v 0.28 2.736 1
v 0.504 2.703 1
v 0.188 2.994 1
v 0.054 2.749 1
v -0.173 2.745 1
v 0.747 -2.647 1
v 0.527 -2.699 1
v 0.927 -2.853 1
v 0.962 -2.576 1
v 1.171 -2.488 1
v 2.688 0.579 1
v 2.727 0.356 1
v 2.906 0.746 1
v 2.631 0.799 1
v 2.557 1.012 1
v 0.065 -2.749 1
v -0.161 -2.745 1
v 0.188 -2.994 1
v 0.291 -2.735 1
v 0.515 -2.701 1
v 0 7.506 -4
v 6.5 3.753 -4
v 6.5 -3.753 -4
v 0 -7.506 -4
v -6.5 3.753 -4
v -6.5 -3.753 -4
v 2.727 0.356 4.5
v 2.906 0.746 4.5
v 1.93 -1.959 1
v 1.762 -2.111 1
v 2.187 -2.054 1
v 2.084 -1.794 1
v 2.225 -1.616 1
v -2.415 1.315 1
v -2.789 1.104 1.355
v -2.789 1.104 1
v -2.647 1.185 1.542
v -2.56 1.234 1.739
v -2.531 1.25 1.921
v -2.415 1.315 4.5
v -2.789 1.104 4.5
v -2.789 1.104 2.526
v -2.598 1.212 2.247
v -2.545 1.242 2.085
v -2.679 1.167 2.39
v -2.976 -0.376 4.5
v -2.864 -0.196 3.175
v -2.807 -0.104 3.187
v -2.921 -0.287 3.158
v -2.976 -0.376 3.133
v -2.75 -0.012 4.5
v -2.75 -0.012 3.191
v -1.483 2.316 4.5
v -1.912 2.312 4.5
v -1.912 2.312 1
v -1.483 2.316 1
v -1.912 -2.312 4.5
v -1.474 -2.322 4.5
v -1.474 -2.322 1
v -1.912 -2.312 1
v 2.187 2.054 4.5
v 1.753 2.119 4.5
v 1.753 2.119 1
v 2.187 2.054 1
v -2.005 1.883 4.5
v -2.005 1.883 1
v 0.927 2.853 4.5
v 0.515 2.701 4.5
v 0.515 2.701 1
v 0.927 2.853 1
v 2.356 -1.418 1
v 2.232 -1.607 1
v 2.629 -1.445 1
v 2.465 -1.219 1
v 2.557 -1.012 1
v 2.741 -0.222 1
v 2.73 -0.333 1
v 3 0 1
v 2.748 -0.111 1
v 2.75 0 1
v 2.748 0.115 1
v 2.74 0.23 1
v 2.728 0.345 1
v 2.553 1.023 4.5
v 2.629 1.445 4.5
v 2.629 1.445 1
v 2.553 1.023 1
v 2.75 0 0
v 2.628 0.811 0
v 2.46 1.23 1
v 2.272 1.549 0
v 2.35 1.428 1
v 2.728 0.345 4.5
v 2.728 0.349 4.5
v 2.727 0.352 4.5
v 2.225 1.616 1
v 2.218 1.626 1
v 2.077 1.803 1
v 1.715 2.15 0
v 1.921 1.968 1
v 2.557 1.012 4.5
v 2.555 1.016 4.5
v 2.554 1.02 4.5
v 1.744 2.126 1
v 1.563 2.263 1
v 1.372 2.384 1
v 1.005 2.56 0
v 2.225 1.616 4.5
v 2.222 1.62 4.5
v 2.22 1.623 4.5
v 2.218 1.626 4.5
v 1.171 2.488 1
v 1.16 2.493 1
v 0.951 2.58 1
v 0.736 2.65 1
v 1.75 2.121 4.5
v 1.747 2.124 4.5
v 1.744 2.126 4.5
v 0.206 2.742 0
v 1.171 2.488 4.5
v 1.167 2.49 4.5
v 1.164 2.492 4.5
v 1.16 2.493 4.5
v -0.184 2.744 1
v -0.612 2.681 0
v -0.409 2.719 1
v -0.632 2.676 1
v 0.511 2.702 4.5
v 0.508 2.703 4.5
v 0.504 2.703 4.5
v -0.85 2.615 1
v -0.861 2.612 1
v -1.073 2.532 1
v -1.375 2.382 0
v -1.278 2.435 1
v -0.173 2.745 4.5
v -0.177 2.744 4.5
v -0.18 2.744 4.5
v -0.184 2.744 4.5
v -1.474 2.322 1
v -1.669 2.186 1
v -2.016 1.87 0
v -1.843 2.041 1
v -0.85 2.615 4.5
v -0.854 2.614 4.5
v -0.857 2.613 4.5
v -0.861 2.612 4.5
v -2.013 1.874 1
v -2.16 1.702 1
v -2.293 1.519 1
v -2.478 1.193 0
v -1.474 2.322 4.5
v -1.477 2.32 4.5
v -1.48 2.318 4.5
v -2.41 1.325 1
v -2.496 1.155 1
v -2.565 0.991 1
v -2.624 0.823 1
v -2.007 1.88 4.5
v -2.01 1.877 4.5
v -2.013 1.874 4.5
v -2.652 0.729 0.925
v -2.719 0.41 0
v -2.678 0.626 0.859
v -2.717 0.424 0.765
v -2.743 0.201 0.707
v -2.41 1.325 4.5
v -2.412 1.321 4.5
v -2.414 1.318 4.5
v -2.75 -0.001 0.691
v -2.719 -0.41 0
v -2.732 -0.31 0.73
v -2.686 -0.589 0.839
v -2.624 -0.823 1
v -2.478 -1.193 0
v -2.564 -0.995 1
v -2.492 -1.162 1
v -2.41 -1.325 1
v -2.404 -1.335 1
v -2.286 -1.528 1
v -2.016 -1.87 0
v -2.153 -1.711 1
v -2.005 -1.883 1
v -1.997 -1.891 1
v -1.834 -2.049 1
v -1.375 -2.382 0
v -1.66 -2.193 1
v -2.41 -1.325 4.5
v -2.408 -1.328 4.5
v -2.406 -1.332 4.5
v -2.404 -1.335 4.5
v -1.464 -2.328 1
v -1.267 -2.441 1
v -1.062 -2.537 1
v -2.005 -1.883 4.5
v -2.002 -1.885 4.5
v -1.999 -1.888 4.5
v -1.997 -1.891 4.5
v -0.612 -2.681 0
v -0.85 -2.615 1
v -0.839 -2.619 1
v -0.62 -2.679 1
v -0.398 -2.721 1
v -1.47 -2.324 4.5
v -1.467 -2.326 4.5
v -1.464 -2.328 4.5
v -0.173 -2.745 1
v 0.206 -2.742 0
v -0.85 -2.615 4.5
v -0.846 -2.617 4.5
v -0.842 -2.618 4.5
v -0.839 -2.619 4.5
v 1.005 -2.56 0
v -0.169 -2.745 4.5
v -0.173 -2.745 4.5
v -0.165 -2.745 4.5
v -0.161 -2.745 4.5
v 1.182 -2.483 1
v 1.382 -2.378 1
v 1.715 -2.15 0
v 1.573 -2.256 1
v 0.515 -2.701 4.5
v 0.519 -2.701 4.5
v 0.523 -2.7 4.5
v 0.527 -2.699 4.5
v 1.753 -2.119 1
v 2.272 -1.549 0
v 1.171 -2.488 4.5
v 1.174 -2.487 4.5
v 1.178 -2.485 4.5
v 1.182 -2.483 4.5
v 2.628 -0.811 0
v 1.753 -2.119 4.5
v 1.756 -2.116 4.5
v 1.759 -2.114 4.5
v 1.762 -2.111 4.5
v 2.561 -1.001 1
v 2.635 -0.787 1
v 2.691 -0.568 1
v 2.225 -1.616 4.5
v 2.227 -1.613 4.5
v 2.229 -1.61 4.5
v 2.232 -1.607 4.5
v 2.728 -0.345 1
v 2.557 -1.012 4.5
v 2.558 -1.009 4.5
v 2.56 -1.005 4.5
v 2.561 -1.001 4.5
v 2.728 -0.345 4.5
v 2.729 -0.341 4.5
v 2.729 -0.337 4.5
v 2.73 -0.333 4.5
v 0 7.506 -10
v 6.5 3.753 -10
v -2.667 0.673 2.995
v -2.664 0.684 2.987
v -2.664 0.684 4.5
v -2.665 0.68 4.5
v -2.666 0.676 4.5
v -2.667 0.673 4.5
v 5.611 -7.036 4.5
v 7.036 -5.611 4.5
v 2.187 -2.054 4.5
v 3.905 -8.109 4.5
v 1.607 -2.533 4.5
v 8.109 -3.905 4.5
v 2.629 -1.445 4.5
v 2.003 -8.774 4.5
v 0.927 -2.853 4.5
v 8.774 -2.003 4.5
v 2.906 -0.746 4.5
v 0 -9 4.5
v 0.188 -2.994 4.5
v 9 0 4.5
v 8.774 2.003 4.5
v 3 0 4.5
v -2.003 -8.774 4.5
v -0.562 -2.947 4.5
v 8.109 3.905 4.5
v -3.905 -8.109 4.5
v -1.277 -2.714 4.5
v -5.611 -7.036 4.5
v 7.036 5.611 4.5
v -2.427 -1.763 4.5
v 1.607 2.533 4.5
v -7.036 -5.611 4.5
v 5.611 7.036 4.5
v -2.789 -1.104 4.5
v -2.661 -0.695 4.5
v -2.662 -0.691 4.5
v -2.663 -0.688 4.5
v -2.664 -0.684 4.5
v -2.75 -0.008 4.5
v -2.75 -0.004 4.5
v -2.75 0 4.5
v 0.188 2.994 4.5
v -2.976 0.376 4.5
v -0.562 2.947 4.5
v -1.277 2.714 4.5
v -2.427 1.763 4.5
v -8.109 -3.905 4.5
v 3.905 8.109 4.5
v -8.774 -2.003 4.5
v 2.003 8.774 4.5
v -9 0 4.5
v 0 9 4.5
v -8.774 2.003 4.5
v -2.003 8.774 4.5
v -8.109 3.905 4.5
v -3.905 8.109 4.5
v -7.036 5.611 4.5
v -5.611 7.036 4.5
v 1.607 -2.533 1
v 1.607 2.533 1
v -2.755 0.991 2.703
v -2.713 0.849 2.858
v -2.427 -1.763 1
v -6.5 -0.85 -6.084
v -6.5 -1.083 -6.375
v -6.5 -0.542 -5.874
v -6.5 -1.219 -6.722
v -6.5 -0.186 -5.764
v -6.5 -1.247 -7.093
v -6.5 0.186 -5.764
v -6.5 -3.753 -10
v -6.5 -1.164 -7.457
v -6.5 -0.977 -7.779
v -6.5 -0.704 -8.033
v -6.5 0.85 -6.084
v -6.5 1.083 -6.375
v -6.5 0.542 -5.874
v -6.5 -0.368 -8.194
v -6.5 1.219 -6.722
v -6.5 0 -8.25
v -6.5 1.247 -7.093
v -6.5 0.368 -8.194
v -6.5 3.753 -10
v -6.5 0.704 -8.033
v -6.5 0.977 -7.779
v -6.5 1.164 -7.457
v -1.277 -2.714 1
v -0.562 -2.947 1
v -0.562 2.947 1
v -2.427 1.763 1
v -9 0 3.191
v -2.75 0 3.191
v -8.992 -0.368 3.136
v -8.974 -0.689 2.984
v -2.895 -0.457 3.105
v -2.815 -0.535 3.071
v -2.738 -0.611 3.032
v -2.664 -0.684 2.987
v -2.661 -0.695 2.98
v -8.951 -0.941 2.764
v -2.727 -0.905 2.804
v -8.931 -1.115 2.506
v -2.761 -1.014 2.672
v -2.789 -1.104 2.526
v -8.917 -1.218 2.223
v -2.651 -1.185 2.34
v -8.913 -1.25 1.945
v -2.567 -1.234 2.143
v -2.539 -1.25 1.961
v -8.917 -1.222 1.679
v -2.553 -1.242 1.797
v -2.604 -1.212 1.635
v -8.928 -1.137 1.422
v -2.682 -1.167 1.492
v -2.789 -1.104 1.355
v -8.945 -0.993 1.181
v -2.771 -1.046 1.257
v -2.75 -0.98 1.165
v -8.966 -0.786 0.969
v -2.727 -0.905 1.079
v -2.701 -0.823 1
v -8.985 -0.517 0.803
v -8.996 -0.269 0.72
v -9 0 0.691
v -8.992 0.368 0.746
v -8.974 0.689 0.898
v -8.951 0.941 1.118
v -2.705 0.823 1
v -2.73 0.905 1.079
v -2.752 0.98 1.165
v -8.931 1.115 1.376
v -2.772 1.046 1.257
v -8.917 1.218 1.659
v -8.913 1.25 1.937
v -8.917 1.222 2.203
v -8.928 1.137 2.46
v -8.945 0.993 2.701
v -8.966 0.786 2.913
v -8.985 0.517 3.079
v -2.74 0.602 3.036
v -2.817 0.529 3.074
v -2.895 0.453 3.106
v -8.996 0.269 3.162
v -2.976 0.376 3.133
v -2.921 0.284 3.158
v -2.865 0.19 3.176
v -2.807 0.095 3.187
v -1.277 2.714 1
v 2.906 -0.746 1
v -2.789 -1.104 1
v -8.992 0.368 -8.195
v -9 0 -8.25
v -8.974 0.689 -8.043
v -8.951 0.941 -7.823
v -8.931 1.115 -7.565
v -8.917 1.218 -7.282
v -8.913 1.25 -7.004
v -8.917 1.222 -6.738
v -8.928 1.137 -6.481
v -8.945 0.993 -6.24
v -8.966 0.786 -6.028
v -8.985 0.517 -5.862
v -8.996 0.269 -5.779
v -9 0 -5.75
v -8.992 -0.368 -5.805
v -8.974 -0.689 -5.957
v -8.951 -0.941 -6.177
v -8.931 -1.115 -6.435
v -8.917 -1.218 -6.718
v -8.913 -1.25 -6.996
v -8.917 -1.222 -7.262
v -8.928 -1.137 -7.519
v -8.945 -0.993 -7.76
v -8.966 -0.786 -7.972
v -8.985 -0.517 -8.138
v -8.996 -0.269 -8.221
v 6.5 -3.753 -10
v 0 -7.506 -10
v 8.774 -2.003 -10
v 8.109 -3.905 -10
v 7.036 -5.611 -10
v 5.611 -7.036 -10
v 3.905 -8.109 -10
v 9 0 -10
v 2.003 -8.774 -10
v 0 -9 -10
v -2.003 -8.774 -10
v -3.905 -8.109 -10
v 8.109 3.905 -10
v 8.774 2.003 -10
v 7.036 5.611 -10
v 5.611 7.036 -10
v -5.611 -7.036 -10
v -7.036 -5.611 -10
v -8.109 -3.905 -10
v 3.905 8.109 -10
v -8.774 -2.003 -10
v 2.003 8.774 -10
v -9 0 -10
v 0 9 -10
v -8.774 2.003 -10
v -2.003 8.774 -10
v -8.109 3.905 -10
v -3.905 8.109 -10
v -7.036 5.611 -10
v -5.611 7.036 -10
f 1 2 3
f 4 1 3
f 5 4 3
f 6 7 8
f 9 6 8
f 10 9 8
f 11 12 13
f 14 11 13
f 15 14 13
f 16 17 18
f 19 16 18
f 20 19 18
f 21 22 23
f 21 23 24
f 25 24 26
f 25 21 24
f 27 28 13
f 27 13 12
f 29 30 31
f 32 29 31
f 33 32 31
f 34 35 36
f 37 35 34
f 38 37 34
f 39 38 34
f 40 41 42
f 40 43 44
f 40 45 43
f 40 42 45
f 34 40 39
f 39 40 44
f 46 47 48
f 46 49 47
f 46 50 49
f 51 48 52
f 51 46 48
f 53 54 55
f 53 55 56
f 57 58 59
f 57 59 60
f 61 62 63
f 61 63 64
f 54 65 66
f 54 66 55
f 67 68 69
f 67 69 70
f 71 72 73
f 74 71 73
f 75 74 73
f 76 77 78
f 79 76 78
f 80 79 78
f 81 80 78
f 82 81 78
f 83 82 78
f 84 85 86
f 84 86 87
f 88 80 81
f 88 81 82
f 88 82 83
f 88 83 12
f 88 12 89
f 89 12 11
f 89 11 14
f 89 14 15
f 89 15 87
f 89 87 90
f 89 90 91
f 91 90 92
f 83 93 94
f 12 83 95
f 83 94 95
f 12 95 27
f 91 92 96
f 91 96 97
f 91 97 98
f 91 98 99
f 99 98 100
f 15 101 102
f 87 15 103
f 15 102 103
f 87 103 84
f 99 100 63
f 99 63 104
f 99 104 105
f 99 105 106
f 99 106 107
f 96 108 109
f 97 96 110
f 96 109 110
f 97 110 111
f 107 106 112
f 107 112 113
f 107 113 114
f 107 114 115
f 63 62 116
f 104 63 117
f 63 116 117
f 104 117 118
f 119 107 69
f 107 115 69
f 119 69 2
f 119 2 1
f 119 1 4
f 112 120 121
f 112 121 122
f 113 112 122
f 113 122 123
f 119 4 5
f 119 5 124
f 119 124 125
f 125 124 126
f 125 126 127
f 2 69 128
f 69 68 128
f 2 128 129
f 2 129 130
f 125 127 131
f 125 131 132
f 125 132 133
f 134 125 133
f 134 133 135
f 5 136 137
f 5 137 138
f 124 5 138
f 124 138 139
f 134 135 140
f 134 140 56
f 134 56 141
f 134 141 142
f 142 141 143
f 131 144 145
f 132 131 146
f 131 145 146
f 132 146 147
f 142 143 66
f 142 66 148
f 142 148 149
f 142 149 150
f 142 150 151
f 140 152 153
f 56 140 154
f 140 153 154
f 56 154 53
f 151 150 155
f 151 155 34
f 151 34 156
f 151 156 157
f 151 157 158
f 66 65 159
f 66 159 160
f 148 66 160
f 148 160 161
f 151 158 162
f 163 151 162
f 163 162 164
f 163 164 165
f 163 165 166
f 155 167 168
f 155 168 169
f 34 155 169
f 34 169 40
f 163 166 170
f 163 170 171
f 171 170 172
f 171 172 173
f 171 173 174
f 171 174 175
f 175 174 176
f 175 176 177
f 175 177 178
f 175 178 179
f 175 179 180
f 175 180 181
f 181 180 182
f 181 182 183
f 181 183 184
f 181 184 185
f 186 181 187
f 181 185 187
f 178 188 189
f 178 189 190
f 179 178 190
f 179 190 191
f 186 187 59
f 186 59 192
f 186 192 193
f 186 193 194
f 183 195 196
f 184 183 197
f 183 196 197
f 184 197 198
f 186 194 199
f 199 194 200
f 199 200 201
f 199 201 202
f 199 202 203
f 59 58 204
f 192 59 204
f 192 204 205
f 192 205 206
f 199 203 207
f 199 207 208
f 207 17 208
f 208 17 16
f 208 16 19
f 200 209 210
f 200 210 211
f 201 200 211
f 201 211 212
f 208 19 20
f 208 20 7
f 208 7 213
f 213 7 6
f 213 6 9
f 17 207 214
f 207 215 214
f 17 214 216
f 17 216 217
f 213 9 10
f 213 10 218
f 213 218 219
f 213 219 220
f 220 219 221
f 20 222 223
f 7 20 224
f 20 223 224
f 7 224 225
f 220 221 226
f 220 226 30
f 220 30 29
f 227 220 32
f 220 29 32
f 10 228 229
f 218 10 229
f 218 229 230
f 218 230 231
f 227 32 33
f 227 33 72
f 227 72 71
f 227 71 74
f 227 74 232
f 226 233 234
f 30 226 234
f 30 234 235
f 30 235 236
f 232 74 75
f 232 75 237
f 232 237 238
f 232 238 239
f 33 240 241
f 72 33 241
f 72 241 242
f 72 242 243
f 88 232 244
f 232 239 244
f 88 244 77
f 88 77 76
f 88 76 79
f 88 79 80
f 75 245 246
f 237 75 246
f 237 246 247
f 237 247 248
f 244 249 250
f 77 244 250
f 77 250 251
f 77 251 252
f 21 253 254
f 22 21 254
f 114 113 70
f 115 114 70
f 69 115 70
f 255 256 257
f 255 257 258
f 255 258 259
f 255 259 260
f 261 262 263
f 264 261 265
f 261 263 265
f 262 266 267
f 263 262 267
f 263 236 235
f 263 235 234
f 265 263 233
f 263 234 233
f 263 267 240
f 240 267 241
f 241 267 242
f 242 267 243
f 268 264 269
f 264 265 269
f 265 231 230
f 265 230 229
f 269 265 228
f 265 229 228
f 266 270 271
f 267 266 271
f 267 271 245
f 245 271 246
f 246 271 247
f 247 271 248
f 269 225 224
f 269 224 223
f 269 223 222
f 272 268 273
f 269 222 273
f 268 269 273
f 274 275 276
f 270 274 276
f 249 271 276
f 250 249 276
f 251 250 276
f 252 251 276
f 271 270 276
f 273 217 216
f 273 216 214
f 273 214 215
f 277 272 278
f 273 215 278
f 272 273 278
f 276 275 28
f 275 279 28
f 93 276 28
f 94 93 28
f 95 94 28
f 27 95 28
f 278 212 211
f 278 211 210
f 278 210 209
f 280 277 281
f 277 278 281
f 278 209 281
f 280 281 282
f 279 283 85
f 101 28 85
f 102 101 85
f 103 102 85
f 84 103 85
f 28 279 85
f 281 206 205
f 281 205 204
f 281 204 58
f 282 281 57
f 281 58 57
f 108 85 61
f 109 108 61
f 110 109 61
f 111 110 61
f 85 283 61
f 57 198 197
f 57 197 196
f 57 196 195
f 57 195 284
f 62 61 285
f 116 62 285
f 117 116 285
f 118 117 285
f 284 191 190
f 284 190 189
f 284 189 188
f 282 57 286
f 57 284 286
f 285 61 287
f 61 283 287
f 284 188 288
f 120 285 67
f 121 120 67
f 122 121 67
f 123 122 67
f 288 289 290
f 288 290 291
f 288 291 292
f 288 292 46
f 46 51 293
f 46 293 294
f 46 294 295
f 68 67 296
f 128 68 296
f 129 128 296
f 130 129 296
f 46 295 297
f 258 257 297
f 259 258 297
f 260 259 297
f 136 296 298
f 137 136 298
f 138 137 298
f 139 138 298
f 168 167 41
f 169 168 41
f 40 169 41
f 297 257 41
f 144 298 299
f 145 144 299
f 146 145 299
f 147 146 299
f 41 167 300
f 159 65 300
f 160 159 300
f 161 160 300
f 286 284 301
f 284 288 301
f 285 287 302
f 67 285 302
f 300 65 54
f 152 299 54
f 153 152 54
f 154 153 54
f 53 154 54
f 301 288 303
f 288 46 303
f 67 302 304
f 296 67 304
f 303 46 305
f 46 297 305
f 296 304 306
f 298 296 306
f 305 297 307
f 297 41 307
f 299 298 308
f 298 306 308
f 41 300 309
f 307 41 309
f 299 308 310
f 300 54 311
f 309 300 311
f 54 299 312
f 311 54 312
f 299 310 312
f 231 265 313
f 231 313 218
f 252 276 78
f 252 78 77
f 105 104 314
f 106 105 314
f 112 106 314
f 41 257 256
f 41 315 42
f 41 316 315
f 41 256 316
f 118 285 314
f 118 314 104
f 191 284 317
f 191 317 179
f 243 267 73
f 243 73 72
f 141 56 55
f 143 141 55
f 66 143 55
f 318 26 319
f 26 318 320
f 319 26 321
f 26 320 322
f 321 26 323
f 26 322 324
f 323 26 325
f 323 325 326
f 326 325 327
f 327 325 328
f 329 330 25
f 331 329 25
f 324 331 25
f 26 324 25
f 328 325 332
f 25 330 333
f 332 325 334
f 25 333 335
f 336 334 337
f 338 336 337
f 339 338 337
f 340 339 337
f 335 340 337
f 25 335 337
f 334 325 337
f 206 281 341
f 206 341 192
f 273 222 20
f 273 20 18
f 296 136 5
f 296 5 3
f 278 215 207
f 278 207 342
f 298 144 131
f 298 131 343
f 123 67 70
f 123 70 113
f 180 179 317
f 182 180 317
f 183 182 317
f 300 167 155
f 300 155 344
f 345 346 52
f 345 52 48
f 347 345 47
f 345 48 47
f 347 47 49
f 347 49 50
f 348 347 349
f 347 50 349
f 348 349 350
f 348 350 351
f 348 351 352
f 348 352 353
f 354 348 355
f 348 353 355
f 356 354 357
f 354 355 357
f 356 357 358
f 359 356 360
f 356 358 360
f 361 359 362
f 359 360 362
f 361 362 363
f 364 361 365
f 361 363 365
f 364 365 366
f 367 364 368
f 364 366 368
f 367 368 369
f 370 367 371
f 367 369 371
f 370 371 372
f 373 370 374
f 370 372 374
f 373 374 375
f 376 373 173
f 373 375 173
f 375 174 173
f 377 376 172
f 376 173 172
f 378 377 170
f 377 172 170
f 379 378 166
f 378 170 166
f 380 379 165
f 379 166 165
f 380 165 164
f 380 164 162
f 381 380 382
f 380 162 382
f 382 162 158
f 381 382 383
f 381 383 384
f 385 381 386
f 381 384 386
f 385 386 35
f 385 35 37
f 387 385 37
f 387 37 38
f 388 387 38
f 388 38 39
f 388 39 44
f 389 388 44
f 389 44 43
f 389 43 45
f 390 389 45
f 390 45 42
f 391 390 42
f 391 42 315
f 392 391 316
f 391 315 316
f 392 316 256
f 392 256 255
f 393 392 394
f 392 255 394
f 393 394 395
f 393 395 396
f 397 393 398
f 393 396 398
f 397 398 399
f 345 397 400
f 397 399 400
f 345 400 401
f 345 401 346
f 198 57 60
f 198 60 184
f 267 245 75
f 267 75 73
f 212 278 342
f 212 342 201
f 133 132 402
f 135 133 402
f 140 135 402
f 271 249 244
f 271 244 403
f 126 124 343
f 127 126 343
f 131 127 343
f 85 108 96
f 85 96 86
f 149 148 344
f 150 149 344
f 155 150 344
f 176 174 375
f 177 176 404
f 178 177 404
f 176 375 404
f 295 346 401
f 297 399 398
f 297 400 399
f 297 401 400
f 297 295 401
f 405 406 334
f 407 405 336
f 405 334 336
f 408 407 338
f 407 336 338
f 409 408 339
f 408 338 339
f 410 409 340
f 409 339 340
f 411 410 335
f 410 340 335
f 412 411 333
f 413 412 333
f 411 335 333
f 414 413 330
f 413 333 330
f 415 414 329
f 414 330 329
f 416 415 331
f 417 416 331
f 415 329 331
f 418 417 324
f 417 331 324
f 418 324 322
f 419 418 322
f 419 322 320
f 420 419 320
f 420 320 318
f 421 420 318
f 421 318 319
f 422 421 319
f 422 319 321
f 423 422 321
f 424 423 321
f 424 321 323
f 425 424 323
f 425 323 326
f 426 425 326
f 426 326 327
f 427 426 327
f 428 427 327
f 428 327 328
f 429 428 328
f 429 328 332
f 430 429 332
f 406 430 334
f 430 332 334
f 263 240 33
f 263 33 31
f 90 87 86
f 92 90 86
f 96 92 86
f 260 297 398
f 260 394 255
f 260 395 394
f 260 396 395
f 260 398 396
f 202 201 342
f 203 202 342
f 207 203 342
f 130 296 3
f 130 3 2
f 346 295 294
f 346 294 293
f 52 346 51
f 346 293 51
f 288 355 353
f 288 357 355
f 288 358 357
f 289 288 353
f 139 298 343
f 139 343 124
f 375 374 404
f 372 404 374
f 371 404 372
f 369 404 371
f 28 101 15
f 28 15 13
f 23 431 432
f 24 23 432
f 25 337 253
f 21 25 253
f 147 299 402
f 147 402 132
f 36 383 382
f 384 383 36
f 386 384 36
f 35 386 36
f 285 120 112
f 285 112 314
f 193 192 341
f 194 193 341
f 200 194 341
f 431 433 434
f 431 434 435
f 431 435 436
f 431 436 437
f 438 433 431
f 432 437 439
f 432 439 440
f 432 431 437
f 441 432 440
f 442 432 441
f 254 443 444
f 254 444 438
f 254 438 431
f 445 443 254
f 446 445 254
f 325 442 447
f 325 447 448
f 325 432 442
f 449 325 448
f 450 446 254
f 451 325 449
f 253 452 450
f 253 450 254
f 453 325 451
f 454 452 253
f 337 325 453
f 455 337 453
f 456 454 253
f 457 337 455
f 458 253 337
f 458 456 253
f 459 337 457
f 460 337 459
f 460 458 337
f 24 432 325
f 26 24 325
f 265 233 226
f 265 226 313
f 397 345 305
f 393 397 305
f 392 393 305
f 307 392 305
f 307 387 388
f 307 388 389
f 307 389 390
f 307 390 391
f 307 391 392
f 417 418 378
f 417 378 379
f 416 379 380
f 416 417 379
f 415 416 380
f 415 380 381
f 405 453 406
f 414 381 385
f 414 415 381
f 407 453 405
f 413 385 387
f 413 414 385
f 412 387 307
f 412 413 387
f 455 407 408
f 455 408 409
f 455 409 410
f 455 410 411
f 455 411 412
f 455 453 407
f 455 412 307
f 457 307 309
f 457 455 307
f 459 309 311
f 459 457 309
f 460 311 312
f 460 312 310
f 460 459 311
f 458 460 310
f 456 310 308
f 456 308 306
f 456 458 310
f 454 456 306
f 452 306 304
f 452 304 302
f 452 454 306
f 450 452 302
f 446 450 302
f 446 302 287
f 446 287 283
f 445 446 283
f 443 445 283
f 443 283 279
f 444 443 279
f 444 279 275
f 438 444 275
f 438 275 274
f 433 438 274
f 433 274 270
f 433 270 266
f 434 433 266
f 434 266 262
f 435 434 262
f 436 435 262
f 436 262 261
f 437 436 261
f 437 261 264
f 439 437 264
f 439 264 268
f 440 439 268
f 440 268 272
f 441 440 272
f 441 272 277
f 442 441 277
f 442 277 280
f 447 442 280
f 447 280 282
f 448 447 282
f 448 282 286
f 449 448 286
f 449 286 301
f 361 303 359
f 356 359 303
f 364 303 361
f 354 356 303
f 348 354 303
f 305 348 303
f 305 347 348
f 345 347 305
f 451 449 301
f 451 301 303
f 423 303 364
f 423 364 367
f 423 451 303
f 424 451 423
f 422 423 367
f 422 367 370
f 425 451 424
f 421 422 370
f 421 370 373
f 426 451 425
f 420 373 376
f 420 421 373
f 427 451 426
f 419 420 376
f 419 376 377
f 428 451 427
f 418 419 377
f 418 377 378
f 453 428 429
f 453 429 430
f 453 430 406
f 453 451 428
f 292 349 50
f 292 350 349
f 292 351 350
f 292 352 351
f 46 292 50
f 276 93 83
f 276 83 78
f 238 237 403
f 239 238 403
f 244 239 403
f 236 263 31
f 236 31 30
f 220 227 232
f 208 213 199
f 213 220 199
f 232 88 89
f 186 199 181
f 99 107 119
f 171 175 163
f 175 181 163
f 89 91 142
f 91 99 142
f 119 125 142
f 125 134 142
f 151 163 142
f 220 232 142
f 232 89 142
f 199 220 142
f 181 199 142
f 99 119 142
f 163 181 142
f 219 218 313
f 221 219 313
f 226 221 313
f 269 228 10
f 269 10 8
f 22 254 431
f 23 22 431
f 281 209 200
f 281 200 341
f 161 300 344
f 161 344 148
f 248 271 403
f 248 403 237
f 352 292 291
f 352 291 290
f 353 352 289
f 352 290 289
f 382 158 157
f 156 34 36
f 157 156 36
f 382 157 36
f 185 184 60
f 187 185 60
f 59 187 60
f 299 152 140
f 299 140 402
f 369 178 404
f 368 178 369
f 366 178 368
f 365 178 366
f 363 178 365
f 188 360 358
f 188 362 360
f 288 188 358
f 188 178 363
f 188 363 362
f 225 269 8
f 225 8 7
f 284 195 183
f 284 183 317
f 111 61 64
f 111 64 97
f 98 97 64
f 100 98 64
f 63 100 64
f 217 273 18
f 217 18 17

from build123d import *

# Parameters (mm, degrees)
SKETCH1_R           = 10
BOSS_EXTRUDE1_DEPTH = 2
SKETCH2_R           = 4.5
BOSS_EXTRUDE2_DEPTH = 2.5
SKETCH3_R           = 2.75
CUT_EXTRUDE1_DEPTH  = 5
CUT_EXTRUDE3_DEPTH  = 3.5
CIRPATTERN1_COUNT   = 25
SKETCH6_R           = 1.5
CUT_EXTRUDE4_DEPTH  = 15.361406616
FILLET1_R           = 0.1
THREAD1_PITCH       = 0.3175
CUT_EXTRUDE5_START  = -10
SKETCH7_R           = 11.568121222
SKETCH7_R_2         = 4.5
CUT_EXTRUDE5_DEPTH  = 10
BOSS_EXTRUDE3_START = 10
SKETCH8_R           = 4.5
BOSS_EXTRUDE3_DEPTH = 10
SKETCH9_R           = 9
SKETCH9_R_2         = 4.5
BOSS_EXTRUDE4_DEPTH = 14.5
CUT_EXTRUDE6_DEPTH  = 6
SKETCH11_R          = 1.25
CUT_EXTRUDE7_DEPTH  = 9


with BuildPart() as part:
    # Sketch1 → Boss-Extrude1 (new body)
    with BuildSketch(Plane.XY):
        Circle(SKETCH1_R)
    extrude(amount=BOSS_EXTRUDE1_DEPTH)

    # Sketch2 → Boss-Extrude2 (add)
    with BuildSketch(Plane.XY.offset(2)):
        Circle(SKETCH2_R)
    extrude(amount=BOSS_EXTRUDE2_DEPTH)

    # Sketch3 → Cut-Extrude1 (cut)
    with BuildSketch(Plane.XY.offset(4.5)):
        Circle(SKETCH3_R)
    extrude(amount=-CUT_EXTRUDE1_DEPTH, mode=Mode.SUBTRACT)

    # Sketch5 → Cut-Extrude3 (cut)
    with BuildSketch(Plane.XY.offset(4.5)):
        Polygon((-2.656507983, 0.682075321), (-2.682344512, 0.606240809), (-2.75, 0), (-2.976344104, 0.375999701), align=None)
    cut_extrude3 = extrude(amount=-CUT_EXTRUDE3_DEPTH, mode=Mode.SUBTRACT)

    # CirPattern1: Cut-Extrude3 ×25 about axis
    cirpattern1_axis = Axis((0, 0, 0), (0, 0, 1))
    for i in range(1, CIRPATTERN1_COUNT):
        add(cut_extrude3.rotate(cirpattern1_axis, i * 360 / CIRPATTERN1_COUNT), mode=Mode.SUBTRACT)

    # Sketch6 → Cut-Extrude4 (cut, through all)
    with BuildSketch(Plane.XY.offset(2)):
        with Locations((-7, 0)):
            Circle(SKETCH6_R)
        with Locations(Location((7, 0, 0), (0, 0, 180))):
            Circle(SKETCH6_R)
        with Locations(Location((0, 7, 0), (0, 0, 180))):
            Circle(SKETCH6_R)
        with Locations((0, -7)):
            Circle(SKETCH6_R)
    extrude(amount=-CUT_EXTRUDE4_DEPTH, mode=Mode.SUBTRACT)

    # Fillet1
    fillet1_edges = [part.edges().sort_by_distance(p)[0] for p in [
        (8.5, 0, 2),
    ]]
    fillet(fillet1_edges, radius=FILLET1_R)

    # Thread1: the profile of Thread Profile3 profile screwed along a right-hand helix of 6.299213 turns, 6 arcs to a turn; built about Z, then put on its axis
    thread1_z = Axis((0, 0, 0), (0, 0, 1))
    thread1_corners = [(1.5003, 0, -0.000173205), (1.5003, 0, 0.277985704), (1.328148085, 0, 0.17859375), (1.328148085, 0, 0.09921875)]
    with BuildLine(mode=Mode.PRIVATE) as thread1_profile:
        Line(thread1_corners[0], thread1_corners[1])
        Line(thread1_corners[1], thread1_corners[2])
        Line(thread1_corners[2], thread1_corners[3])
        Line(thread1_corners[3], thread1_corners[0])
    thread1_cap = Face(thread1_profile.wire())
    thread1_turn_angles = [0, 30, 60, 90, 120, 150, 180, 210, 240, 270, 300, 330, 360]
    thread1_turn_weights = [1, 0.8660254037844387, 1, 0.8660254037844387, 1, 0.8660254037844387, 1, 0.8660254037844387, 1, 0.8660254037844387, 1, 0.8660254037844387, 1]
    thread1_turn_rails = [Edge.make_bspline([Vector(p[0], p[1], 0).rotate(thread1_z, thread1_turn_angles[k]) / thread1_turn_weights[k] + Vector(0, 0, p[2] + THREAD1_PITCH * thread1_turn_angles[k] / 360) for k in range(13)], [0, 0, 0, 1, 1, 2, 2, 3, 3, 4, 4, 5, 5, 6, 6, 6], 2, thread1_turn_weights) for p in thread1_corners]
    thread1_turn_sides = [Face.make_surface_from_curves(thread1_turn_rails[p[0]], thread1_turn_rails[p[1]]) for p in [(0, 1), (1, 2), (2, 3), (3, 0)]]
    thread1_last_angles = [2160, 2190, 2220, 2243.858267717, 2267.716535433]
    thread1_last_weights = [1, 0.8660254037844387, 1, 0.9145488039507501, 1]
    thread1_last_rails = [Edge.make_bspline([Vector(p[0], p[1], 0).rotate(thread1_z, thread1_last_angles[k]) / thread1_last_weights[k] + Vector(0, 0, p[2] + THREAD1_PITCH * thread1_last_angles[k] / 360) for k in range(5)], [0, 0, 0, 1, 1, 2, 2, 2], 2, thread1_last_weights) for p in thread1_corners]
    thread1_last_sides = [Face.make_surface_from_curves(thread1_last_rails[p[0]], thread1_last_rails[p[1]]) for p in [(0, 1), (1, 2), (2, 3), (3, 0)]]
    thread1 = Plane(origin=(7, 0, 1.9), x_dir=(-1, 0, 0), z_dir=(0, 0, -1)) * Solid(Shell([*[p.moved(Location((0, 0, THREAD1_PITCH * i))) for i in range(6) for p in thread1_turn_sides], *thread1_last_sides, thread1_cap, thread1_cap.rotate(thread1_z, 2267.716535433).moved(Location((0, 0, THREAD1_PITCH * 2267.716535433 / 360)))]))
    add(thread1)

    # Sketch7 → Cut-Extrude5 (cut)
    with BuildSketch(Plane.XY.offset(4.5).offset(CUT_EXTRUDE5_START)):
        Circle(SKETCH7_R)
        Circle(SKETCH7_R_2, mode=Mode.SUBTRACT)
    extrude(amount=CUT_EXTRUDE5_DEPTH, mode=Mode.SUBTRACT)

    # Sketch8 → Boss-Extrude3 (add)
    with BuildSketch(Plane(origin=(0, 0, 0), x_dir=(-1, 0, 0), z_dir=(0, 0, -1)).offset(BOSS_EXTRUDE3_START)):
        Circle(SKETCH8_R)
    extrude(amount=-BOSS_EXTRUDE3_DEPTH)

    # Sketch9 → Boss-Extrude4 (add)
    # profile 1 of 2: a face of its own
    with BuildSketch(Plane(origin=(0, 0, -10), x_dir=(-1, 0, 0), z_dir=(0, 0, -1))):
        Circle(SKETCH9_R)
        Polygon((5, 2.886751346), (0, 5.773502692), (-5, 2.886751346), (-5, -2.886751346), (0, -5.773502692), (5, -2.886751346), align=None, mode=Mode.SUBTRACT)
    # profile 2 of 2: a face of its own
    with BuildSketch(Plane(origin=(0, 0, -10), x_dir=(-1, 0, 0), z_dir=(0, 0, -1))):
        Polygon((5, -2.886751346), (5, 2.886751346), (0, 5.773502692), (-5, 2.886751346), (-5, -2.886751346), (0, -5.773502692), align=None)
        Circle(SKETCH9_R_2, mode=Mode.SUBTRACT)
    extrude(amount=-BOSS_EXTRUDE4_DEPTH)

    # Sketch10 → Cut-Extrude6 (cut)
    with BuildSketch(Plane(origin=(0, 0, -10), x_dir=(-1, 0, 0), z_dir=(0, 0, -1))):
        Polygon((0, 7.505553499), (-6.5, 3.75277675), (-6.5, -3.75277675), (0, -7.505553499), (6.5, -3.75277675), (6.5, 3.75277675), align=None)
    extrude(amount=-CUT_EXTRUDE6_DEPTH, mode=Mode.SUBTRACT)

    # Sketch11 → Cut-Extrude7 (cut)
    with BuildSketch(Plane(origin=(0, 0, 0), x_dir=(0, 0, -1), z_dir=(1, 0, 0))):
        with Locations(Location((-1.940949094, 0, 0), (0, 0, 180.000000024))):
            Circle(SKETCH11_R)
        with Locations((7, 0)):
            Circle(SKETCH11_R)
    extrude(amount=-CUT_EXTRUDE7_DEPTH, mode=Mode.SUBTRACT)


solid = part.part
